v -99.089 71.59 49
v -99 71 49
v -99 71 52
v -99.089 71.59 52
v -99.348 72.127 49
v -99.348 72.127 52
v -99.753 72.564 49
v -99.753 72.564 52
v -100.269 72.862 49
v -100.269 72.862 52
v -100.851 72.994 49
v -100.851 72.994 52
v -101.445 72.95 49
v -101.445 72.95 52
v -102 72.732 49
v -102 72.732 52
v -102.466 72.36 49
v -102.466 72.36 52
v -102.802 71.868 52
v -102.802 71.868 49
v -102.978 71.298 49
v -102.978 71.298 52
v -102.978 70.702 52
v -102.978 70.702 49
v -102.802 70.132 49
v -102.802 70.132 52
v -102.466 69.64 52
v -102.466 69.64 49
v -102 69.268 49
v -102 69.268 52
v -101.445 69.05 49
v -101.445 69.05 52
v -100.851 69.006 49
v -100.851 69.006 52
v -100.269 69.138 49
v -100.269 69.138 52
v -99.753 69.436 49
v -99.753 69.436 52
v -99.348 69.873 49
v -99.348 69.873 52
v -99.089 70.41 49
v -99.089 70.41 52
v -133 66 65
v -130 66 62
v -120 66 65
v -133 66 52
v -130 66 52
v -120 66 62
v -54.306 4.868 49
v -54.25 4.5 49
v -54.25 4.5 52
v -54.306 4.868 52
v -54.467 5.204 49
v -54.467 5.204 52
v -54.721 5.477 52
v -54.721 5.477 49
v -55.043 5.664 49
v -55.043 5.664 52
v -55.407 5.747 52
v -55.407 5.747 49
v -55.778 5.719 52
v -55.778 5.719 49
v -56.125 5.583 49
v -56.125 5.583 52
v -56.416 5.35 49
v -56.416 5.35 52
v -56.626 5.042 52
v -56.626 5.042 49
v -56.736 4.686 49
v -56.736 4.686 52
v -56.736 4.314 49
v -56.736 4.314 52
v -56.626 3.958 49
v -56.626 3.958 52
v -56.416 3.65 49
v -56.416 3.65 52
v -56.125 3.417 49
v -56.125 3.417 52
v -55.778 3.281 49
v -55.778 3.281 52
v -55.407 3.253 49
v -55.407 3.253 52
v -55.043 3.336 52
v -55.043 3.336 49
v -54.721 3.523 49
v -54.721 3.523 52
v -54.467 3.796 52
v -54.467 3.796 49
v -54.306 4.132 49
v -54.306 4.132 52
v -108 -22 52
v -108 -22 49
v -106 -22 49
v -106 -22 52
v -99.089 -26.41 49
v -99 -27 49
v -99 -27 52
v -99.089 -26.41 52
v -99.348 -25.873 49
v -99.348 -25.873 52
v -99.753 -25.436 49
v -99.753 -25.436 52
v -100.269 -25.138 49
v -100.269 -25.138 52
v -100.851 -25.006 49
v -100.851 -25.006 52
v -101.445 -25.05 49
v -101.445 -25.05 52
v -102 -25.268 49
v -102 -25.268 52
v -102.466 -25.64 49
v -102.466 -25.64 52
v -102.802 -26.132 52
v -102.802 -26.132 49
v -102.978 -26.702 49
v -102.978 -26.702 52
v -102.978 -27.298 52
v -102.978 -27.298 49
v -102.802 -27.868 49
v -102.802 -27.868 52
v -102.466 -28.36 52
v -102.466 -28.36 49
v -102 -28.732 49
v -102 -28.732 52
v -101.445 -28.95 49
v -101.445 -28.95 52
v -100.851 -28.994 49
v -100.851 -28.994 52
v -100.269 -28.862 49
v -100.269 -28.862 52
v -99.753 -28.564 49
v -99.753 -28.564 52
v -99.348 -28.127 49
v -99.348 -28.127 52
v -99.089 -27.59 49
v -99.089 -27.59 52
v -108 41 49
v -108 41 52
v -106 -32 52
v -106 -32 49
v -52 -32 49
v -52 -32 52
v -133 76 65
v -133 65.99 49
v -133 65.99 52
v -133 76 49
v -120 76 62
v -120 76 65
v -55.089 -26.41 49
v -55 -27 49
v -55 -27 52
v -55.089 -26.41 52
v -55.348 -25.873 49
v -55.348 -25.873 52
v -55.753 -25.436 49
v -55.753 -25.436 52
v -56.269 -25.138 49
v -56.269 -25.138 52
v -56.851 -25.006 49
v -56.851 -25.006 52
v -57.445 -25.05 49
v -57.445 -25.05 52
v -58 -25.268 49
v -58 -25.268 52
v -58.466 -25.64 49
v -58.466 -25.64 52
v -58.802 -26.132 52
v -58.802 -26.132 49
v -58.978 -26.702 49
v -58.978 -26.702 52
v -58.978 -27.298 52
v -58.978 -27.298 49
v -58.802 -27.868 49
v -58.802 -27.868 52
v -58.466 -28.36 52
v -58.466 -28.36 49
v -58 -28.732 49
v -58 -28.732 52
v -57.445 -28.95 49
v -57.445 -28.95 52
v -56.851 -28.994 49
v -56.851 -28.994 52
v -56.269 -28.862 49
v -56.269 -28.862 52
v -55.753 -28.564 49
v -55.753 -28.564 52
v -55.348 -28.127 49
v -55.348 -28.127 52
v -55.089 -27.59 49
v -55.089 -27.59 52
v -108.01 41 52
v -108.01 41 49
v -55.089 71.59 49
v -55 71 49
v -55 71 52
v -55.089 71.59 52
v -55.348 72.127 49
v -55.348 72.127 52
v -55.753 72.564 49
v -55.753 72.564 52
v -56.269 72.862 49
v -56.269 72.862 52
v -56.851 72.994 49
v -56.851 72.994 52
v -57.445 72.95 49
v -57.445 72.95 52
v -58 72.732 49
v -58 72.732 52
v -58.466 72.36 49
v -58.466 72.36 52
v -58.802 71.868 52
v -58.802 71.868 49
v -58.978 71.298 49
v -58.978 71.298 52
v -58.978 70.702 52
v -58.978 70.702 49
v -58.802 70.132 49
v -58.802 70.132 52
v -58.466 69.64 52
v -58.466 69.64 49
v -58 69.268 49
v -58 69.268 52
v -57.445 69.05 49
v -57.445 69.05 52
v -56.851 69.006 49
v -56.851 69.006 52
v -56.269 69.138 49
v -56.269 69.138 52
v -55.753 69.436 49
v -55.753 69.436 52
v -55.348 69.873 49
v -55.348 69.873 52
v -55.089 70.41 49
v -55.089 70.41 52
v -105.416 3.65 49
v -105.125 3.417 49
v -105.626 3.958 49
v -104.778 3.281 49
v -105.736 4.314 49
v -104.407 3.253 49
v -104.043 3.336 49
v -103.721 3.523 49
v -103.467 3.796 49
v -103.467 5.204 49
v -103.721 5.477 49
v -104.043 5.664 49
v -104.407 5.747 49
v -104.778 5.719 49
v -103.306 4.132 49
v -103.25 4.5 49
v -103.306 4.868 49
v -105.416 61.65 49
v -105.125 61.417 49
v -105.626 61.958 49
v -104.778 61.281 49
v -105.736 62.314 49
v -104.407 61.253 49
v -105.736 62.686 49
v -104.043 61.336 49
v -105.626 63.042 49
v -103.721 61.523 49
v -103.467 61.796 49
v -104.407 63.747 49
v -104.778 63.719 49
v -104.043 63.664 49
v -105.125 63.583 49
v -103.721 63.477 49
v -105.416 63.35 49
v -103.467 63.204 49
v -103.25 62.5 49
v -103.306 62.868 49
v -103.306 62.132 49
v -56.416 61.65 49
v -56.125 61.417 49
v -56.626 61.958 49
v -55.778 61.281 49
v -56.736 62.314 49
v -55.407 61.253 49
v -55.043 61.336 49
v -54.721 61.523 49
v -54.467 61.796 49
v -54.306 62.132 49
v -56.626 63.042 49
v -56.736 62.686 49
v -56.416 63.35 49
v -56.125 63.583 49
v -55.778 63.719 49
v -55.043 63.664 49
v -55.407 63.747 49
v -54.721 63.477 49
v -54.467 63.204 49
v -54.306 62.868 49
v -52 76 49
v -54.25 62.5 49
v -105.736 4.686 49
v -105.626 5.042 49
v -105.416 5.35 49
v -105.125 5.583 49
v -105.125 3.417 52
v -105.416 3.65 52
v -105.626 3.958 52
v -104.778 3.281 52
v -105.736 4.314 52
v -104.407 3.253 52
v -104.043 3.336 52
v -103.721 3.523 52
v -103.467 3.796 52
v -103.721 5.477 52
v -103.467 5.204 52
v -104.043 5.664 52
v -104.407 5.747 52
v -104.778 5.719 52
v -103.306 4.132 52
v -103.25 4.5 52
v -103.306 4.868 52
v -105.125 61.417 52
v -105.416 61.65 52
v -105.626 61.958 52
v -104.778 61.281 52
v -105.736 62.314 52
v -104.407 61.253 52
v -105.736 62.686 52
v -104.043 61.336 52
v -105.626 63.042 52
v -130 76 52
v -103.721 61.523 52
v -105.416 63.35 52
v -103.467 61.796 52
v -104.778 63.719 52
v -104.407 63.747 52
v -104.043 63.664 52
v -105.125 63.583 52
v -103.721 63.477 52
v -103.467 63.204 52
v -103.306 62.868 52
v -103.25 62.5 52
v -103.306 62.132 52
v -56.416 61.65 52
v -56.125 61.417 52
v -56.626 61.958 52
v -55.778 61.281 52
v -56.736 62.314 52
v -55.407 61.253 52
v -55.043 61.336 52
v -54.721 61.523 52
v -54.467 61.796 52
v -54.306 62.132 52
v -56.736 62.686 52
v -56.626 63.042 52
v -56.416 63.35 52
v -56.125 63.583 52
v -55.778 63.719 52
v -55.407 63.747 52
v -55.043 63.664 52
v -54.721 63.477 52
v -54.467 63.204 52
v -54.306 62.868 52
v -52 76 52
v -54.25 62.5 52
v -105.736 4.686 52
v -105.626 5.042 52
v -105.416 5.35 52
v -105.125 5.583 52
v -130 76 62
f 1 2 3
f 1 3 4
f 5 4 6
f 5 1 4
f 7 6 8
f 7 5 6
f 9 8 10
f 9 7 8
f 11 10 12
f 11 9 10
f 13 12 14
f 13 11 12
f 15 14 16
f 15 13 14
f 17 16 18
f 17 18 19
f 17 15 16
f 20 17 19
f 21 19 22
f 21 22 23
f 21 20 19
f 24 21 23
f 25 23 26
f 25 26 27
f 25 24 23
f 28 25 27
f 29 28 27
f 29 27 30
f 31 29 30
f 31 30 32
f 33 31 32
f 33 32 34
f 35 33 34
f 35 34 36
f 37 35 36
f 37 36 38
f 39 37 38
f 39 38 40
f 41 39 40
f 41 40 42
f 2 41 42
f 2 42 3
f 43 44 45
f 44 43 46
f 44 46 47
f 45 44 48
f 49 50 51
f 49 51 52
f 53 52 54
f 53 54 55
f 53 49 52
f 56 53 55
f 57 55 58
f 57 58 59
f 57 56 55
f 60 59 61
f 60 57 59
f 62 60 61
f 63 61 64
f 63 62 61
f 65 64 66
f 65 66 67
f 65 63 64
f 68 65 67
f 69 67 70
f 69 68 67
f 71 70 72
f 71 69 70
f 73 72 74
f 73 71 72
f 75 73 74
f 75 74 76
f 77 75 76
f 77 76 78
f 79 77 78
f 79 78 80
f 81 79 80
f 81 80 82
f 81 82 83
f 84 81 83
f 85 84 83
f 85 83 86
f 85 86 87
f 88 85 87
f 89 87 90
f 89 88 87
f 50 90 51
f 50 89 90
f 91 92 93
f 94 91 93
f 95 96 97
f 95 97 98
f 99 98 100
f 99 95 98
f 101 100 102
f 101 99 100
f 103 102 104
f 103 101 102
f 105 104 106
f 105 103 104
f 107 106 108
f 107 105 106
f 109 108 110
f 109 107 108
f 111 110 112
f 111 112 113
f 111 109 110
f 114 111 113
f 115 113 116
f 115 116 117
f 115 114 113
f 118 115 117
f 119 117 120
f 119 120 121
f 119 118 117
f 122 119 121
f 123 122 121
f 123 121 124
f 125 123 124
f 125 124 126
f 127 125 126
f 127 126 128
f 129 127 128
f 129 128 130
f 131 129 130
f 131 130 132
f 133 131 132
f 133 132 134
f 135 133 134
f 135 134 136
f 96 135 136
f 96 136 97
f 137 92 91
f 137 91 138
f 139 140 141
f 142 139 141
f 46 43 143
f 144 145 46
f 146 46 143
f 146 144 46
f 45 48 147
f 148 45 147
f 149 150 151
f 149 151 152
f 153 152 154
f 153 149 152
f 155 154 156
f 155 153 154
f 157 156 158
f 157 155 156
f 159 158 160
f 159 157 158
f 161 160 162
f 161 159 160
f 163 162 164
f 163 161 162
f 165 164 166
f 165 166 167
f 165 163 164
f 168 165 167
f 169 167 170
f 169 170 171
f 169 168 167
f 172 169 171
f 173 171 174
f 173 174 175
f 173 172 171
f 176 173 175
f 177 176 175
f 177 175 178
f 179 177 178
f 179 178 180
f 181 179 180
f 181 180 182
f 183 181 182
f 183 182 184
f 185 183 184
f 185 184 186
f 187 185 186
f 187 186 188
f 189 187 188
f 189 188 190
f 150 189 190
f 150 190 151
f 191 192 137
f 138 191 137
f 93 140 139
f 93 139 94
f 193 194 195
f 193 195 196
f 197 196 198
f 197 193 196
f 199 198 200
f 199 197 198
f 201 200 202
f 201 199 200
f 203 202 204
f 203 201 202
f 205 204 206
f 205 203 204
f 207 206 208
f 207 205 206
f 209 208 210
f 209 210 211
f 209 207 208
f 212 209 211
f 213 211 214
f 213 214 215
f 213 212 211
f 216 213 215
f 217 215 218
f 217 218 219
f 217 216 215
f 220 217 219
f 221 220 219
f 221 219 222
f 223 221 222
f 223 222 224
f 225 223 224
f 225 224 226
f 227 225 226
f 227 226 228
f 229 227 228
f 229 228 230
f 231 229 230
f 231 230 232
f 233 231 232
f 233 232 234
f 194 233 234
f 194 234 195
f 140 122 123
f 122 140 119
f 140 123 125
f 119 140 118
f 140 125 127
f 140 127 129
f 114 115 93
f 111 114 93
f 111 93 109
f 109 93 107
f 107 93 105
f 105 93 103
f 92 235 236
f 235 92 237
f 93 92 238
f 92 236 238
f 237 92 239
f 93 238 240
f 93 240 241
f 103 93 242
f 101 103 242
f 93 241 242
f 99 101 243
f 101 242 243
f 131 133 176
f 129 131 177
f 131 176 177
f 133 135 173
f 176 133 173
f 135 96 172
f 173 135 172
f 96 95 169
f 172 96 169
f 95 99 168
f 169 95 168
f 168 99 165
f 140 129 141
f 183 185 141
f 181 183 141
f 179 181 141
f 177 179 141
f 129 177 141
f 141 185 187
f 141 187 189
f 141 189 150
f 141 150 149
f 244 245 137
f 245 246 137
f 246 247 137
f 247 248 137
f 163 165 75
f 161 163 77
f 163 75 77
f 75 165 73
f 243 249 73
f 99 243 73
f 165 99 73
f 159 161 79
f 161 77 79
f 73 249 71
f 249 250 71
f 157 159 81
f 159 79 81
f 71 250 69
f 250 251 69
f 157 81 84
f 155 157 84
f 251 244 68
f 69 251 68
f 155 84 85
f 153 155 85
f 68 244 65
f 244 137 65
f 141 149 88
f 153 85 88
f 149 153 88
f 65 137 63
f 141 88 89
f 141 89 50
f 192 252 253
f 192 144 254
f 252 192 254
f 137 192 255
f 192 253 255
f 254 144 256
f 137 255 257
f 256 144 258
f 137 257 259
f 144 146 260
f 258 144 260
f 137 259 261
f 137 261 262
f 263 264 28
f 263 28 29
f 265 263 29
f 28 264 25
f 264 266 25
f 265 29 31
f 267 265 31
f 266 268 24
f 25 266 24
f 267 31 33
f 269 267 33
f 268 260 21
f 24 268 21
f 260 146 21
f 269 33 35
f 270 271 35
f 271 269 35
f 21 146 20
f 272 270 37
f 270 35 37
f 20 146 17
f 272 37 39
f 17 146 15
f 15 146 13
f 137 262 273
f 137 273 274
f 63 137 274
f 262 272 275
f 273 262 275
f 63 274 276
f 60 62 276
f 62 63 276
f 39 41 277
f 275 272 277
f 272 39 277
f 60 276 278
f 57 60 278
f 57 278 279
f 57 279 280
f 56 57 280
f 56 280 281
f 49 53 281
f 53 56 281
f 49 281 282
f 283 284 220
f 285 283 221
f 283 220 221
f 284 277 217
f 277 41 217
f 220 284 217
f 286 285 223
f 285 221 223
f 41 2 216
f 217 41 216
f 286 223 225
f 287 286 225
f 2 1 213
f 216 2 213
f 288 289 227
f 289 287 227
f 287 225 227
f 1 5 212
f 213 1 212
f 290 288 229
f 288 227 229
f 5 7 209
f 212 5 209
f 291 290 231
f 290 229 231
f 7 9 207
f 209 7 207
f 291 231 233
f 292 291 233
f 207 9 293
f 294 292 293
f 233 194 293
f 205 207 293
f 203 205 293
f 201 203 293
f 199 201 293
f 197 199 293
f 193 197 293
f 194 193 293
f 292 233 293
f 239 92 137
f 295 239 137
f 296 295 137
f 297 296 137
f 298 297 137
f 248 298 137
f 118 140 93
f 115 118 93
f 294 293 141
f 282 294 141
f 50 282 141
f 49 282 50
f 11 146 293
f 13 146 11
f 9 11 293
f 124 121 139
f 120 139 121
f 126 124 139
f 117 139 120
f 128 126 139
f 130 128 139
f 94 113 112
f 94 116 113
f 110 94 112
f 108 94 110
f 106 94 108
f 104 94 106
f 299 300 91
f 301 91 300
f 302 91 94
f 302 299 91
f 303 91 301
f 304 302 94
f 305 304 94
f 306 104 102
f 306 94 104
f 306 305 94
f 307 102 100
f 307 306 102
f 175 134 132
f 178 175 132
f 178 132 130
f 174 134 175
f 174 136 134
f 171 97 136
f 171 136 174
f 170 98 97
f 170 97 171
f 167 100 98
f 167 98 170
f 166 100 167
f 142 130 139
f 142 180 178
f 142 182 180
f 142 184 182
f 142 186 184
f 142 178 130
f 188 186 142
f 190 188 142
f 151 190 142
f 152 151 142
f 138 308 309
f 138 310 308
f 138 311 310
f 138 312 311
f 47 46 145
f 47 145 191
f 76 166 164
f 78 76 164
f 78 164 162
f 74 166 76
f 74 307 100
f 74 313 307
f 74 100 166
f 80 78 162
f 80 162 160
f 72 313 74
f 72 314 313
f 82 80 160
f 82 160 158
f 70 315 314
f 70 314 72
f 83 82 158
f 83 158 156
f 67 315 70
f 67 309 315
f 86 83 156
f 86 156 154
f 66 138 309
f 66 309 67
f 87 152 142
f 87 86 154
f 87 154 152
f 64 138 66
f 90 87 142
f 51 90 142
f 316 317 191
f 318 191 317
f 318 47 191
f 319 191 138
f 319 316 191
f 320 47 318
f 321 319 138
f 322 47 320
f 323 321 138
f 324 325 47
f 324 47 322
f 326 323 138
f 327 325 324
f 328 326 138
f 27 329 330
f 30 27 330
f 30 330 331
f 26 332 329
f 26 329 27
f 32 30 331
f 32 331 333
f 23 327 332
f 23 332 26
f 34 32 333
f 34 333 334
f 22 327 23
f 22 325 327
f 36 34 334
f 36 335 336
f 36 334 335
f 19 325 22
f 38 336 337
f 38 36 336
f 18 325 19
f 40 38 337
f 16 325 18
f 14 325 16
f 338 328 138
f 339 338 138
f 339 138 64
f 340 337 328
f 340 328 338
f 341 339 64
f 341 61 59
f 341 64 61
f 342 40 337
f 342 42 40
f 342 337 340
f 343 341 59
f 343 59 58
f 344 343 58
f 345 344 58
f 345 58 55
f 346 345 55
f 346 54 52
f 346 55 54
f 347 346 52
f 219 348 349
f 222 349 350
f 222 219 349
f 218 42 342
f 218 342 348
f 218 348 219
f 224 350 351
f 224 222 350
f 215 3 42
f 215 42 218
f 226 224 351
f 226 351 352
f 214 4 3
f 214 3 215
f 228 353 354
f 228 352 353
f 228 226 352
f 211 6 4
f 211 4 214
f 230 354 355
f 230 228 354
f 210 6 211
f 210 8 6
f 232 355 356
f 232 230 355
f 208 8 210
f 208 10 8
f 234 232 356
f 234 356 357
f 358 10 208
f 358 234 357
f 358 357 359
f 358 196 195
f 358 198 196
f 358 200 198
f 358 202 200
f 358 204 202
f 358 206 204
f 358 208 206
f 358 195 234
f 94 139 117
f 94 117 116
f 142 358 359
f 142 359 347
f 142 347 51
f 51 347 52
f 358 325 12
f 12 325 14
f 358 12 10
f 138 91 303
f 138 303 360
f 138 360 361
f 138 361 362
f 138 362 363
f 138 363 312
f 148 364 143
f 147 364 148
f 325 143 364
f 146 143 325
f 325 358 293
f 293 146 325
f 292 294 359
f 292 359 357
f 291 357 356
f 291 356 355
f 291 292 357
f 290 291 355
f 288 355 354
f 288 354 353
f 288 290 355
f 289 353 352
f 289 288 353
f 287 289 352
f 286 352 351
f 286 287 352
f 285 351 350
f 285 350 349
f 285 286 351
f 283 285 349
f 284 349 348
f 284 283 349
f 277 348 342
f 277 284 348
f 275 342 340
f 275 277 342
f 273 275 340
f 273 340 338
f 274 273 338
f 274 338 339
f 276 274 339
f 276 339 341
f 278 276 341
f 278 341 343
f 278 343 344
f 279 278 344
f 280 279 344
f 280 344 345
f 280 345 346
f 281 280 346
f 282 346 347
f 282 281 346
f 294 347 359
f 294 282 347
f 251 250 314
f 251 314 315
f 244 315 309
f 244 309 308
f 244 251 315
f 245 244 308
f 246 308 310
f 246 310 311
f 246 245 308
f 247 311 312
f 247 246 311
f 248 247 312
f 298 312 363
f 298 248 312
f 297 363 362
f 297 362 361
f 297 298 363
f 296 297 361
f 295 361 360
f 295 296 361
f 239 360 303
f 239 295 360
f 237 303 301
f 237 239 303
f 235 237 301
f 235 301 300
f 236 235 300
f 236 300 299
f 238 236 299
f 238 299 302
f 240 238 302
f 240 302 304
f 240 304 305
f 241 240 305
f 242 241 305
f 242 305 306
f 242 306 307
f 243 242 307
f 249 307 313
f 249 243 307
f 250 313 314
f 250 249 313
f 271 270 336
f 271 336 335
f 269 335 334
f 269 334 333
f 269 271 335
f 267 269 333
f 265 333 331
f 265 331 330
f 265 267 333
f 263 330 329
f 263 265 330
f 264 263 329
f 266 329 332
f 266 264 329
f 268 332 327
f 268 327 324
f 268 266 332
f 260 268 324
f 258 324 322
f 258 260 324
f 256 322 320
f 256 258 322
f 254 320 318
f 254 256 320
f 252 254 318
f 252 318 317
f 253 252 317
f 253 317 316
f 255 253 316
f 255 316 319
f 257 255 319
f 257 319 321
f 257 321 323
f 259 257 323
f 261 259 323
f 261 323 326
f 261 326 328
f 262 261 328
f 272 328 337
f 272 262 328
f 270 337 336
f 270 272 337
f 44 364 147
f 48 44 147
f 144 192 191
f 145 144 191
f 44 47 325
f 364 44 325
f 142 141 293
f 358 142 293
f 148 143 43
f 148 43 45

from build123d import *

# Parameters (mm, degrees)
BOX419_W          = 13
BOX419_H          = 10
BOX419_DEPTH      = 3
CYLINDER197_R     = 2
CYLINDER197_DEPTH = 20
CYLINDER199_R     = 2
CYLINDER199_DEPTH = 20
CYLINDER196_R     = 2
CYLINDER196_DEPTH = 20
CYLINDER198_R     = 2
CYLINDER198_DEPTH = 20
BOX365_W          = 3
BOX365_H          = 10
BOX365_DEPTH      = 13
BOX295_W          = 81
BOX295_H          = 10
BOX295_DEPTH      = 3
BOX366_W          = 25
BOX366_H          = 25
BOX366_DEPTH      = 3
CHAMFER024_SIZE   = 24.99
BOX293_W          = 54
BOX293_H          = 10
BOX293_DEPTH      = 3
CYLINDER065_R     = 1.25
CYLINDER065_DEPTH = 3
CYLINDER066_R     = 1.25
CYLINDER066_DEPTH = 3
CYLINDER067_R     = 1.25
CYLINDER067_DEPTH = 3
CYLINDER064_R     = 1.25
CYLINDER064_DEPTH = 3
BOX260_W          = 56
BOX260_H          = 88
BOX260_DEPTH      = 3


with BuildPart() as box419:
    # Box419 → Box419 (new body)
    with BuildSketch(Plane(origin=(-133, 66, 62), x_dir=(1, 0, 0), z_dir=(0, 0, 1))):
        with Locations((6.5, 5)):
            Rectangle(BOX419_W, BOX419_H)
    extrude(amount=BOX419_DEPTH)


with BuildPart() as cylinder197:
    # Cylinder197 → Cylinder197 (new body)
    with BuildSketch(Plane(origin=(-101, 71, 32), x_dir=(1, 0, 0), z_dir=(0, 0, 1))):
        Circle(CYLINDER197_R)
    extrude(amount=CYLINDER197_DEPTH)


with BuildPart() as cylinder199:
    # Cylinder199 → Cylinder199 (new body)
    with BuildSketch(Plane(origin=(-101, -27, 32), x_dir=(1, 0, 0), z_dir=(0, 0, 1))):
        Circle(CYLINDER199_R)
    extrude(amount=CYLINDER199_DEPTH)


with BuildPart() as cylinder196:
    # Cylinder196 → Cylinder196 (new body)
    with BuildSketch(Plane(origin=(-57, -27, 32), x_dir=(1, 0, 0), z_dir=(0, 0, 1))):
        Circle(CYLINDER196_R)
    extrude(amount=CYLINDER196_DEPTH)


with BuildPart() as fusion196:
    # Cylinder198 → Cylinder198 (new body)
    with BuildSketch(Plane(origin=(-57, 71, 32), x_dir=(1, 0, 0), z_dir=(0, 0, 1))):
        Circle(CYLINDER198_R)
    extrude(amount=CYLINDER198_DEPTH)

    # Fusion196: union Cylinder197, Cylinder199, Cylinder196
    add(cylinder197.part)
    add(cylinder199.part)
    add(cylinder196.part)


with BuildPart() as box365:
    # Box365 → Box365 (new body)
    with BuildSketch(Plane(origin=(-133, 66, 49), x_dir=(1, 0, 0), z_dir=(0, 0, 1))):
        with Locations((1.5, 5)):
            Rectangle(BOX365_W, BOX365_H)
    extrude(amount=BOX365_DEPTH)


with BuildPart() as box295:
    # Box295 → Box295 (new body)
    with BuildSketch(Plane(origin=(-133, 66, 49), x_dir=(1, 0, 0), z_dir=(0, 0, 1))):
        with Locations((40.5, 5)):
            Rectangle(BOX295_W, BOX295_H)
    extrude(amount=BOX295_DEPTH)


with BuildPart() as chamfer024:
    # Box366 → Box366 (new body)
    with BuildSketch(Plane(origin=(-133, 41, 49), x_dir=(1, 0, 0), z_dir=(0, 0, 1))):
        with Locations((12.5, 12.5)):
            Rectangle(BOX366_W, BOX366_H)
    extrude(amount=BOX366_DEPTH)

    # Chamfer024
    chamfer024_edges = [chamfer024.edges().sort_by_distance(p)[0] for p in [
        (-133, 41, 50.5),
    ]]
    chamfer(chamfer024_edges, length=CHAMFER024_SIZE)


with BuildPart() as box293:
    # Box293 → Box293 (new body)
    with BuildSketch(Plane(origin=(-106, -32, 49), x_dir=(1, 0, 0), z_dir=(0, 0, 1))):
        with Locations((27, 5)):
            Rectangle(BOX293_W, BOX293_H)
    extrude(amount=BOX293_DEPTH)


with BuildPart() as cylinder065:
    # Cylinder065 → Cylinder065 (new body)
    with BuildSketch(Plane(origin=(-51.5, 62.5, 37), x_dir=(1, 0, 0), z_dir=(0, 0, 1))):
        Circle(CYLINDER065_R)
    extrude(amount=CYLINDER065_DEPTH)


with BuildPart() as cylinder066:
    # Cylinder066 → Cylinder066 (new body)
    with BuildSketch(Plane(origin=(-51.5, 4.5, 37), x_dir=(1, 0, 0), z_dir=(0, 0, 1))):
        Circle(CYLINDER066_R)
    extrude(amount=CYLINDER066_DEPTH)


with BuildPart() as cylinder067:
    # Cylinder067 → Cylinder067 (new body)
    with BuildSketch(Plane(origin=(-100.5, 4.5, 37), x_dir=(1, 0, 0), z_dir=(0, 0, 1))):
        Circle(CYLINDER067_R)
    extrude(amount=CYLINDER067_DEPTH)


with BuildPart() as fusion193:
    # Cylinder064 → Cylinder064 (new body)
    with BuildSketch(Plane(origin=(-100.5, 62.5, 37), x_dir=(1, 0, 0), z_dir=(0, 0, 1))):
        Circle(CYLINDER064_R)
    extrude(amount=CYLINDER064_DEPTH)

    # Fusion193: union Cylinder065, Cylinder066, Cylinder067
    add(cylinder065.part)
    add(cylinder066.part)
    add(cylinder067.part)


with BuildPart() as fusion262:
    # Box260 → Box260 (new body)
    with BuildSketch(Plane(origin=(-104, -22, 37), x_dir=(1, 0, 0), z_dir=(0, 0, 1))):
        with Locations((28, 44)):
            Rectangle(BOX260_W, BOX260_H)
    extrude(amount=BOX260_DEPTH)

    # Cut251: cut Fusion193
    add(fusion193.part, mode=Mode.SUBTRACT)


with BuildPart() as fusion262_1:
    # Cut251 placement: moved
    add(fusion262.part.moved(Location((-4, 0, 12))))

    # Fusion194: union Box295, Chamfer024, Box293
    add(box295.part)
    add(chamfer024.part)
    add(box293.part)

    # Fusion195: union Box365
    add(box365.part)

    # Cut252: cut Fusion196
    add(fusion196.part, mode=Mode.SUBTRACT)

    # Fusion262: union Box419
    add(box419.part)


solid = fusion262_1.part
